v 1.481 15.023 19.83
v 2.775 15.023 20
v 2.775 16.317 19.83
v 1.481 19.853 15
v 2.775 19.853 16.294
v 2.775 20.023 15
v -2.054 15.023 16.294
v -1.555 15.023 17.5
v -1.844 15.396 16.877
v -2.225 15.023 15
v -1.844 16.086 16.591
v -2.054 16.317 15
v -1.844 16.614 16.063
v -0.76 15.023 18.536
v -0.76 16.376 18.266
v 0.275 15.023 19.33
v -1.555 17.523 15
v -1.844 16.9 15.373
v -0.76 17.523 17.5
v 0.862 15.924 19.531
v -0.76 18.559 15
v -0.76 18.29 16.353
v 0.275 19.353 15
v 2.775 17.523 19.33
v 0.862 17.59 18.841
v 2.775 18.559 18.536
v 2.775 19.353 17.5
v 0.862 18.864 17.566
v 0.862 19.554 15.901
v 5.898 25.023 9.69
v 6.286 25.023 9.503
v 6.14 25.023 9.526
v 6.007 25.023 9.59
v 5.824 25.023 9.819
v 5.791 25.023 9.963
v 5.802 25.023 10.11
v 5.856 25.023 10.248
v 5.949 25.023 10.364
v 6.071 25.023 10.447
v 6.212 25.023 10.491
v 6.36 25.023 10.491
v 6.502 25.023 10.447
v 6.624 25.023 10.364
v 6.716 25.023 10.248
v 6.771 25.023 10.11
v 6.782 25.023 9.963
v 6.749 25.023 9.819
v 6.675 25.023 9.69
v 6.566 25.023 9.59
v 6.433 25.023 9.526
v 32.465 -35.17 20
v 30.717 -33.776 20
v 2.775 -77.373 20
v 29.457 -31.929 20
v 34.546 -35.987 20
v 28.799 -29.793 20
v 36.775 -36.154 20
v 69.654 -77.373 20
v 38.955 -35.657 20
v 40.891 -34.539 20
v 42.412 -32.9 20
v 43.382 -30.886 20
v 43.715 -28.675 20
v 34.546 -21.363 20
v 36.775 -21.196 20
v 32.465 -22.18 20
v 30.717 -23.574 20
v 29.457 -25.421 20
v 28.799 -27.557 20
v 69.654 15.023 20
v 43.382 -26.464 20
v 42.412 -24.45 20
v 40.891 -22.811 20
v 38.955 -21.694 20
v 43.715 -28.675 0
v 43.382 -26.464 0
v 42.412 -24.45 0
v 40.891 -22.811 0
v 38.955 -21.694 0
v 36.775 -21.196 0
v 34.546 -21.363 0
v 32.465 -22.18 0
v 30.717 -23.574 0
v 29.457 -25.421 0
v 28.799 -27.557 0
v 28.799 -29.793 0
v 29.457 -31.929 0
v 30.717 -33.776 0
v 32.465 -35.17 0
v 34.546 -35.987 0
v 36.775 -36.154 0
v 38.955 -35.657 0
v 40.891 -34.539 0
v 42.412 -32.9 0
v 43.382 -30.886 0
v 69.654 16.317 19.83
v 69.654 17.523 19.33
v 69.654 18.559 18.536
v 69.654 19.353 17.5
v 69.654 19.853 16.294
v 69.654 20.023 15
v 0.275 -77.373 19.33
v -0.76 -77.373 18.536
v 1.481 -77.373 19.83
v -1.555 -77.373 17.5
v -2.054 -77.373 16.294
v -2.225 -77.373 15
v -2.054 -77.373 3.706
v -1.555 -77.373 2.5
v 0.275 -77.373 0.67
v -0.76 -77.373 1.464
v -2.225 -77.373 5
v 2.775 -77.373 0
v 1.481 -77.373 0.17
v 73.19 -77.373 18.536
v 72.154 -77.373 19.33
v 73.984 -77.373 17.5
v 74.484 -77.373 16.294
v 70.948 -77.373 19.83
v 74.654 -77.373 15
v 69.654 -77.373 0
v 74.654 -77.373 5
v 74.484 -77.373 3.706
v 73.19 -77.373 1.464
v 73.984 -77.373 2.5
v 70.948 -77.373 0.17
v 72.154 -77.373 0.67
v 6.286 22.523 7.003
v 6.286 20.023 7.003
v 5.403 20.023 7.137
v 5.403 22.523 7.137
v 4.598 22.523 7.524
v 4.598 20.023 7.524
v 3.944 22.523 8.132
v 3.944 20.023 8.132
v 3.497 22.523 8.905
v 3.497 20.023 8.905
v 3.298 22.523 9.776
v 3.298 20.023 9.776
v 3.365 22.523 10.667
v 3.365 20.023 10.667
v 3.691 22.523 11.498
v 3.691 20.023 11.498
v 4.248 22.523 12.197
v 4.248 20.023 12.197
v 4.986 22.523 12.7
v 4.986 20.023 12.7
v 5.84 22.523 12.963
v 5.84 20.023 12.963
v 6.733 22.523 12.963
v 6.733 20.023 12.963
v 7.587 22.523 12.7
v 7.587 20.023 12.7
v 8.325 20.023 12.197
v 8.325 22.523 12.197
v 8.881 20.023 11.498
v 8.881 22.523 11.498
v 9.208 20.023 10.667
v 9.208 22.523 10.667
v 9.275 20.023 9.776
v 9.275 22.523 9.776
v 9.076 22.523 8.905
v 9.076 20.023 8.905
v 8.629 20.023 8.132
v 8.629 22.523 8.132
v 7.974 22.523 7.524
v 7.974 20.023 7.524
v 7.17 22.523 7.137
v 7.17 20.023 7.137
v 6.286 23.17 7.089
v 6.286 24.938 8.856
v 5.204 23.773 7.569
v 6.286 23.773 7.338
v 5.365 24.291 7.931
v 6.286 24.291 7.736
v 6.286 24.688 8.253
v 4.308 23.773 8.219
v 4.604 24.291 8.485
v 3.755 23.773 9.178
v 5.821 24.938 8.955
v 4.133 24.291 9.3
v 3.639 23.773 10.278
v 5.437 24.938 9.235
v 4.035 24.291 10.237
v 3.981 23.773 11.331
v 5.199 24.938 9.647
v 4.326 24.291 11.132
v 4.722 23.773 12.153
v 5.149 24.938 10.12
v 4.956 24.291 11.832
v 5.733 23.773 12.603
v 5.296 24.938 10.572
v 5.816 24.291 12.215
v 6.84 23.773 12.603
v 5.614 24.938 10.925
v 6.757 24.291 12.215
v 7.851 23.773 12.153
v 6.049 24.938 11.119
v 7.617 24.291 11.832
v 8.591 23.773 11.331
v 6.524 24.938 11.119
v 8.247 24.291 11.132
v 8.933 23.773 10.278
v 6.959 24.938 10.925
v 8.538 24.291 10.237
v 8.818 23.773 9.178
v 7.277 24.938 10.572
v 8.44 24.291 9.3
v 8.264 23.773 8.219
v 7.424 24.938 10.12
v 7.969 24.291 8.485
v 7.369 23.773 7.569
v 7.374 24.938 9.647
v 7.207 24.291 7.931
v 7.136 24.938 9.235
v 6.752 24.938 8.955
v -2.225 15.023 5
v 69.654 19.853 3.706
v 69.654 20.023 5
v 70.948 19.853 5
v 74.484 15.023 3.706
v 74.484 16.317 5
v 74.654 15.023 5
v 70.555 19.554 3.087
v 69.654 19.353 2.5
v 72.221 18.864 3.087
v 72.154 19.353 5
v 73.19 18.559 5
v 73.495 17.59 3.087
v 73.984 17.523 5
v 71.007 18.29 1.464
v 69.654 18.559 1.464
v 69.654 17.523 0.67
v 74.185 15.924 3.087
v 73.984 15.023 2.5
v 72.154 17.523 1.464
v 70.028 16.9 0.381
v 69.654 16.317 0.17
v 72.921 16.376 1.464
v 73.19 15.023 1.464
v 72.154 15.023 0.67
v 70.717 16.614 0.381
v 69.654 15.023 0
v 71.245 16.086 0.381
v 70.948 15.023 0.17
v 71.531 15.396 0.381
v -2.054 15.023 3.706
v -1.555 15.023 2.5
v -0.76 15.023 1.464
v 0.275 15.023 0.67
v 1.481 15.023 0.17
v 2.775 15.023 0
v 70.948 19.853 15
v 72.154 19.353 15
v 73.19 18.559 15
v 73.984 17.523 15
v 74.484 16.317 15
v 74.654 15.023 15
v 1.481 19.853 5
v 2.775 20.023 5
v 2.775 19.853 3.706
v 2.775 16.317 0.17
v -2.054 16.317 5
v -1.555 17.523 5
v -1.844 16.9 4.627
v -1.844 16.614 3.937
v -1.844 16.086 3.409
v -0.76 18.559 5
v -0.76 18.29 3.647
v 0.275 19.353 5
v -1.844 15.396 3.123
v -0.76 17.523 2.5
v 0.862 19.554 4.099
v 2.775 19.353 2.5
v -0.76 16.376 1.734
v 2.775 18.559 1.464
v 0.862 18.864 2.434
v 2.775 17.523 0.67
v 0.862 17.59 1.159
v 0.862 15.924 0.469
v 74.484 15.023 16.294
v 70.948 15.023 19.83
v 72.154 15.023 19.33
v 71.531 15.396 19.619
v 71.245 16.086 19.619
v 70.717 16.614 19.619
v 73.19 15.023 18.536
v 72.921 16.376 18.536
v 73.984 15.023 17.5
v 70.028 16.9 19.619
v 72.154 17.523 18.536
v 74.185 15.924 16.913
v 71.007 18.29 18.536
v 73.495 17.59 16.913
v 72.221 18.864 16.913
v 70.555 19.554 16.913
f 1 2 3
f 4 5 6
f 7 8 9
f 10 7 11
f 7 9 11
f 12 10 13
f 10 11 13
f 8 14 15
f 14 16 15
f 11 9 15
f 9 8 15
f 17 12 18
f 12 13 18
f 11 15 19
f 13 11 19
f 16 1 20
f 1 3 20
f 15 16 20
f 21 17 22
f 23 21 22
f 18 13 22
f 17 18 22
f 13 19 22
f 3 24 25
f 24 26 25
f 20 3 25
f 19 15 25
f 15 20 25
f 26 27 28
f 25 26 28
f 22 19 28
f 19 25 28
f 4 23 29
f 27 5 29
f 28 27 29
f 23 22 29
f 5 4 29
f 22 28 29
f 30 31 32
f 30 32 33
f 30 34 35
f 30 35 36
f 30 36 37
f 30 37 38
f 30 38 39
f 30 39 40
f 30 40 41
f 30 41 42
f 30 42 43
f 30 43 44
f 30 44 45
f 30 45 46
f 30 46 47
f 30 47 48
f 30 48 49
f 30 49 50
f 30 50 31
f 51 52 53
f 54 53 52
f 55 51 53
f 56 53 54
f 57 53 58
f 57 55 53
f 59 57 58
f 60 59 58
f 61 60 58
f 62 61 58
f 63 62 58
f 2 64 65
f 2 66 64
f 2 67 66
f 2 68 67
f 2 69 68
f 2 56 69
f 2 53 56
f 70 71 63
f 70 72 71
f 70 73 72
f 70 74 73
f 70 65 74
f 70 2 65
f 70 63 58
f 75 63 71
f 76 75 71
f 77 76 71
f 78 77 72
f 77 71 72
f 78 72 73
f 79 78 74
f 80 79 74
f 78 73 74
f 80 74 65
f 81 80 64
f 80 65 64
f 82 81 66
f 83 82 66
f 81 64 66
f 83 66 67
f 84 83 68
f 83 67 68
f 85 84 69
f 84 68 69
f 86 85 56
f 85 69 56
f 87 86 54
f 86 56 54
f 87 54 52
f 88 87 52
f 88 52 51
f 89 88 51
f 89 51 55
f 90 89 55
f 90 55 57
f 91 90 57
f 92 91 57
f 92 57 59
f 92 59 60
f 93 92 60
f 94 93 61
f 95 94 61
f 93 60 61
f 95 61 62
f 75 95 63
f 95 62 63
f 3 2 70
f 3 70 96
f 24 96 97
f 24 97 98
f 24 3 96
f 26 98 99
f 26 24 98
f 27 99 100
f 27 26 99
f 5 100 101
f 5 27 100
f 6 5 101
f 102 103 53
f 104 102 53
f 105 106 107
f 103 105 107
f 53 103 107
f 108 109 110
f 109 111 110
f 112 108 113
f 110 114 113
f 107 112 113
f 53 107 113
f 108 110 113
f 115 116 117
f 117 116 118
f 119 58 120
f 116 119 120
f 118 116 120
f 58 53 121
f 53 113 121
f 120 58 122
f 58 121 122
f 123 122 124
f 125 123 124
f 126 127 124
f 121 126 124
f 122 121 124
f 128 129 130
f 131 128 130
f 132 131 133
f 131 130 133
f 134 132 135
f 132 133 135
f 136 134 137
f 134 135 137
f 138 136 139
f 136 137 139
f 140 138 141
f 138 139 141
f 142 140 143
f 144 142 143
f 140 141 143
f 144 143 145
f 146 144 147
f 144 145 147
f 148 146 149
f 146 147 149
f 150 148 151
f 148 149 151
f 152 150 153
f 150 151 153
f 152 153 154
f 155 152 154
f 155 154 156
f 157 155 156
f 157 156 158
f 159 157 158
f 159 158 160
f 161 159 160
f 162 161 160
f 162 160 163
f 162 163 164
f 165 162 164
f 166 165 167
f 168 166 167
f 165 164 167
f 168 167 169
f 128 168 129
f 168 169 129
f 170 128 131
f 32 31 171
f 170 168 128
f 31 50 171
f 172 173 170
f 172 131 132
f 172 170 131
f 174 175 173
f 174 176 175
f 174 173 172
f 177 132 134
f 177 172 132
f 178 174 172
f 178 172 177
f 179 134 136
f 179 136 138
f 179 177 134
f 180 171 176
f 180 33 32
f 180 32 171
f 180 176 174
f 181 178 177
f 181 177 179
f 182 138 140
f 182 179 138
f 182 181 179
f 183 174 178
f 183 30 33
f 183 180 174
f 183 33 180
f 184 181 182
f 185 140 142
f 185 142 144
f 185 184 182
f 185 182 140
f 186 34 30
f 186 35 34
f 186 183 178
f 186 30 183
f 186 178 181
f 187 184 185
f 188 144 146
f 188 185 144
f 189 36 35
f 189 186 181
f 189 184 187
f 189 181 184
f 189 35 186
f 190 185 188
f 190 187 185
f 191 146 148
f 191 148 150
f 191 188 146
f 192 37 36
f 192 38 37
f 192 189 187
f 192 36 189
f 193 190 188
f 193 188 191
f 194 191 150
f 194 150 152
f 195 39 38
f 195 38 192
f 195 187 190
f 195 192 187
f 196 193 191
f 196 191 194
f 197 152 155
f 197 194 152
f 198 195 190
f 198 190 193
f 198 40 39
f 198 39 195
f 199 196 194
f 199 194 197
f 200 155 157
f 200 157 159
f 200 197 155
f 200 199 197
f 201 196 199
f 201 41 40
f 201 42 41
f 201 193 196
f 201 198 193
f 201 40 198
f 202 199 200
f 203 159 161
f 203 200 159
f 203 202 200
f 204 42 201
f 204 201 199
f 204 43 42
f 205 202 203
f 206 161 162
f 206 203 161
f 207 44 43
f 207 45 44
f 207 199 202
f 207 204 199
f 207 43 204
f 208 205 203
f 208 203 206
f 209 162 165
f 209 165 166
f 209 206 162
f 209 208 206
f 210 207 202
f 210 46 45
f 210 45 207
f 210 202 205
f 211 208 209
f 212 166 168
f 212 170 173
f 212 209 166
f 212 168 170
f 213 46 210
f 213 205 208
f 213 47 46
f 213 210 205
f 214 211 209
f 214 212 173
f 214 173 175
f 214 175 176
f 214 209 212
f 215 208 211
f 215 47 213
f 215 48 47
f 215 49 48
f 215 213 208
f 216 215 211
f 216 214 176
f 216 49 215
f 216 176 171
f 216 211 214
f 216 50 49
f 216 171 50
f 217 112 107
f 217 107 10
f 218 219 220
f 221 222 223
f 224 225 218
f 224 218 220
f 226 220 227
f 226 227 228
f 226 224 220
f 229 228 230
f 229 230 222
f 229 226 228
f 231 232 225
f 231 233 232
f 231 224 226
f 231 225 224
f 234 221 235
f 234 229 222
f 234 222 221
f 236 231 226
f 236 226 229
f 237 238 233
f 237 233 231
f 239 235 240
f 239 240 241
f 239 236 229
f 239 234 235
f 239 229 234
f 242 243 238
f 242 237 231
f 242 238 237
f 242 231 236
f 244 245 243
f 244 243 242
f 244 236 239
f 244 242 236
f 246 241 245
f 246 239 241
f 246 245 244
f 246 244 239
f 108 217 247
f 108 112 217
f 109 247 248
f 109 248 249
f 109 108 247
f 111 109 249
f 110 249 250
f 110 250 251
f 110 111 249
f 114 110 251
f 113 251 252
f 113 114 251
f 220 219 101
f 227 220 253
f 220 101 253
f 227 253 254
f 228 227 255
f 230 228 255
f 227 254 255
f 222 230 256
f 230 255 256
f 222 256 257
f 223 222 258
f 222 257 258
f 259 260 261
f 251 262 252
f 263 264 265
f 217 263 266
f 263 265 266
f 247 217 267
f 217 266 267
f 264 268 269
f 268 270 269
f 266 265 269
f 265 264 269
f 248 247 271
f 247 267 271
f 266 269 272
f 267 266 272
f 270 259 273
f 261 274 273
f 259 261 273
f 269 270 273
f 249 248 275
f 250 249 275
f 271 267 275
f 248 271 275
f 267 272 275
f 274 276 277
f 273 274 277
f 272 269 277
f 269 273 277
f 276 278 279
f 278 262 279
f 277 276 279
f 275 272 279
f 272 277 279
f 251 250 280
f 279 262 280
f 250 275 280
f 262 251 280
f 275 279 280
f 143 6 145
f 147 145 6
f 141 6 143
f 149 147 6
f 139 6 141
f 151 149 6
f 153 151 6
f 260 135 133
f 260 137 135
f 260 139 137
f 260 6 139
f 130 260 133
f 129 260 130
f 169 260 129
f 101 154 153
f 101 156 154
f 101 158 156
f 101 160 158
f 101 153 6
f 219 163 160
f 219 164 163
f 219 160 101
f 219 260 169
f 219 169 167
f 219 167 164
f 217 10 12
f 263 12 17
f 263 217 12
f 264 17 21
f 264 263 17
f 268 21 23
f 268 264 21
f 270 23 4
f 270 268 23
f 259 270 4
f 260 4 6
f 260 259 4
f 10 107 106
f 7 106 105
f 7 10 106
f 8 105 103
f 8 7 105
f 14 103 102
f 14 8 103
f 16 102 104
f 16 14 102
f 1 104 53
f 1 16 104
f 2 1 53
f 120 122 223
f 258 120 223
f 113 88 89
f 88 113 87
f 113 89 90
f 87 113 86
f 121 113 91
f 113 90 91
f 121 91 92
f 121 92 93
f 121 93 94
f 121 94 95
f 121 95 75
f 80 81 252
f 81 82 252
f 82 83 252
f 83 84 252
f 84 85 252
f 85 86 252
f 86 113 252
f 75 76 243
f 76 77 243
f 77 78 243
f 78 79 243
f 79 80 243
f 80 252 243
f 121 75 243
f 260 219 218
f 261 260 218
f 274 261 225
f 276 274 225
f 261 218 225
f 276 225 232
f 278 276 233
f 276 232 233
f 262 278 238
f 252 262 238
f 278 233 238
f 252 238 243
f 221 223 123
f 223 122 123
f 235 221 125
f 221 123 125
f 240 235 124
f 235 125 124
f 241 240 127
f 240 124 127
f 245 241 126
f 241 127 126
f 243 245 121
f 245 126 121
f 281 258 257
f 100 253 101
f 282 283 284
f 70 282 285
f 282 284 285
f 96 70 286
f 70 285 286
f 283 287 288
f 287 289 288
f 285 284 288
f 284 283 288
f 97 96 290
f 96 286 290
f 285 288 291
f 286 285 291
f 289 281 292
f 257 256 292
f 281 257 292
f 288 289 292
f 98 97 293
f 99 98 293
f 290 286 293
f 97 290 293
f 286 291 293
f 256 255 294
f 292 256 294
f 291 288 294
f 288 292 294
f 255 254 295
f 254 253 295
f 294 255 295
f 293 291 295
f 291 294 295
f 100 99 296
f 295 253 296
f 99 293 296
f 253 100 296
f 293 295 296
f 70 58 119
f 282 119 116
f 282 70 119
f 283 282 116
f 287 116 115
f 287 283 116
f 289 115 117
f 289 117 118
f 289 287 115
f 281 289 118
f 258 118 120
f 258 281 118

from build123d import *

# Parameters (mm, degrees)
SKETCH1_W           = 76.879071809
SKETCH1_H           = 97.396637597
BOSS_EXTRUDE1_DEPTH = 20
SKETCH2_R           = 7.5
CUT_EXTRUDE1_DEPTH  = 20
FILLET2_R           = 5
FILLET3_R           = 5
FILLET4_R           = 5
FILLET5_R           = 5
SKETCH3_R           = 2.996522069
BOSS_EXTRUDE2_DEPTH = 5
FILLET7_R           = 2.5


with BuildPart() as part:
    # Sketch1 → Boss-Extrude1 (new body)
    with BuildSketch(Plane.XY):
        with Locations((36.214739615, -28.675152186)):
            Rectangle(SKETCH1_W, SKETCH1_H)
    extrude(amount=BOSS_EXTRUDE1_DEPTH)

    # Sketch2 → Cut-Extrude1 (cut)
    with BuildSketch(Plane.XY.offset(20)):
        with Locations((36.214739614, -28.675152186)):
            Circle(SKETCH2_R)
    extrude(amount=-CUT_EXTRUDE1_DEPTH, mode=Mode.SUBTRACT)

    # Fillet2
    fillet2_edges = [part.edges().sort_by_distance(p)[0] for p in [
        (74.654275519, 20.023166613, 10),
    ]]
    fillet(fillet2_edges, radius=FILLET2_R)

    # Fillet3
    fillet3_edges = [part.edges().sort_by_distance(p)[0] for p in [
        (74.654275519, -31.175152186, 20),
        (33.714739614, 20.023166613, 20),
        (73.189809425, 18.558700519, 20),
    ]]
    fillet(fillet3_edges, radius=FILLET3_R)

    # Fillet4
    fillet4_edges = [part.edges().sort_by_distance(p)[0] for p in [
        (33.714739614, 20.023166613, 0),
        (73.189809425, 18.558700519, 0),
        (74.654275519, -31.175152186, 0),
    ]]
    fillet(fillet4_edges, radius=FILLET4_R)

    # Fillet5
    fillet5_edges = [part.edges().sort_by_distance(p)[0] for p in [
        (-2.22479629, -31.175152186, 20),
        (-2.22479629, 20.023166613, 10),
        (-2.22479629, 18.558700519, 18.535533906),
        (-2.22479629, -31.175152186, 0),
        (-2.22479629, 18.558700519, 1.464466094),
    ]]
    fillet(fillet5_edges, radius=FILLET5_R)

    # Sketch3 → Boss-Extrude2 (add)
    with BuildSketch(Plane(origin=(0, 20.023166613, 0), x_dir=(1, 0, 0), z_dir=(0, 1, 0))):
        with Locations(Location((6.286432744, -10, 0), (0, 0, 90))):
            Circle(SKETCH3_R)
    extrude(amount=BOSS_EXTRUDE2_DEPTH)

    # Fillet7
    fillet7_edges = [part.edges().sort_by_distance(p)[0] for p in [
        (6.286432744, 25.023166613, 12.996522069),
    ]]
    fillet(fillet7_edges, radius=FILLET7_R)


solid = part.part
